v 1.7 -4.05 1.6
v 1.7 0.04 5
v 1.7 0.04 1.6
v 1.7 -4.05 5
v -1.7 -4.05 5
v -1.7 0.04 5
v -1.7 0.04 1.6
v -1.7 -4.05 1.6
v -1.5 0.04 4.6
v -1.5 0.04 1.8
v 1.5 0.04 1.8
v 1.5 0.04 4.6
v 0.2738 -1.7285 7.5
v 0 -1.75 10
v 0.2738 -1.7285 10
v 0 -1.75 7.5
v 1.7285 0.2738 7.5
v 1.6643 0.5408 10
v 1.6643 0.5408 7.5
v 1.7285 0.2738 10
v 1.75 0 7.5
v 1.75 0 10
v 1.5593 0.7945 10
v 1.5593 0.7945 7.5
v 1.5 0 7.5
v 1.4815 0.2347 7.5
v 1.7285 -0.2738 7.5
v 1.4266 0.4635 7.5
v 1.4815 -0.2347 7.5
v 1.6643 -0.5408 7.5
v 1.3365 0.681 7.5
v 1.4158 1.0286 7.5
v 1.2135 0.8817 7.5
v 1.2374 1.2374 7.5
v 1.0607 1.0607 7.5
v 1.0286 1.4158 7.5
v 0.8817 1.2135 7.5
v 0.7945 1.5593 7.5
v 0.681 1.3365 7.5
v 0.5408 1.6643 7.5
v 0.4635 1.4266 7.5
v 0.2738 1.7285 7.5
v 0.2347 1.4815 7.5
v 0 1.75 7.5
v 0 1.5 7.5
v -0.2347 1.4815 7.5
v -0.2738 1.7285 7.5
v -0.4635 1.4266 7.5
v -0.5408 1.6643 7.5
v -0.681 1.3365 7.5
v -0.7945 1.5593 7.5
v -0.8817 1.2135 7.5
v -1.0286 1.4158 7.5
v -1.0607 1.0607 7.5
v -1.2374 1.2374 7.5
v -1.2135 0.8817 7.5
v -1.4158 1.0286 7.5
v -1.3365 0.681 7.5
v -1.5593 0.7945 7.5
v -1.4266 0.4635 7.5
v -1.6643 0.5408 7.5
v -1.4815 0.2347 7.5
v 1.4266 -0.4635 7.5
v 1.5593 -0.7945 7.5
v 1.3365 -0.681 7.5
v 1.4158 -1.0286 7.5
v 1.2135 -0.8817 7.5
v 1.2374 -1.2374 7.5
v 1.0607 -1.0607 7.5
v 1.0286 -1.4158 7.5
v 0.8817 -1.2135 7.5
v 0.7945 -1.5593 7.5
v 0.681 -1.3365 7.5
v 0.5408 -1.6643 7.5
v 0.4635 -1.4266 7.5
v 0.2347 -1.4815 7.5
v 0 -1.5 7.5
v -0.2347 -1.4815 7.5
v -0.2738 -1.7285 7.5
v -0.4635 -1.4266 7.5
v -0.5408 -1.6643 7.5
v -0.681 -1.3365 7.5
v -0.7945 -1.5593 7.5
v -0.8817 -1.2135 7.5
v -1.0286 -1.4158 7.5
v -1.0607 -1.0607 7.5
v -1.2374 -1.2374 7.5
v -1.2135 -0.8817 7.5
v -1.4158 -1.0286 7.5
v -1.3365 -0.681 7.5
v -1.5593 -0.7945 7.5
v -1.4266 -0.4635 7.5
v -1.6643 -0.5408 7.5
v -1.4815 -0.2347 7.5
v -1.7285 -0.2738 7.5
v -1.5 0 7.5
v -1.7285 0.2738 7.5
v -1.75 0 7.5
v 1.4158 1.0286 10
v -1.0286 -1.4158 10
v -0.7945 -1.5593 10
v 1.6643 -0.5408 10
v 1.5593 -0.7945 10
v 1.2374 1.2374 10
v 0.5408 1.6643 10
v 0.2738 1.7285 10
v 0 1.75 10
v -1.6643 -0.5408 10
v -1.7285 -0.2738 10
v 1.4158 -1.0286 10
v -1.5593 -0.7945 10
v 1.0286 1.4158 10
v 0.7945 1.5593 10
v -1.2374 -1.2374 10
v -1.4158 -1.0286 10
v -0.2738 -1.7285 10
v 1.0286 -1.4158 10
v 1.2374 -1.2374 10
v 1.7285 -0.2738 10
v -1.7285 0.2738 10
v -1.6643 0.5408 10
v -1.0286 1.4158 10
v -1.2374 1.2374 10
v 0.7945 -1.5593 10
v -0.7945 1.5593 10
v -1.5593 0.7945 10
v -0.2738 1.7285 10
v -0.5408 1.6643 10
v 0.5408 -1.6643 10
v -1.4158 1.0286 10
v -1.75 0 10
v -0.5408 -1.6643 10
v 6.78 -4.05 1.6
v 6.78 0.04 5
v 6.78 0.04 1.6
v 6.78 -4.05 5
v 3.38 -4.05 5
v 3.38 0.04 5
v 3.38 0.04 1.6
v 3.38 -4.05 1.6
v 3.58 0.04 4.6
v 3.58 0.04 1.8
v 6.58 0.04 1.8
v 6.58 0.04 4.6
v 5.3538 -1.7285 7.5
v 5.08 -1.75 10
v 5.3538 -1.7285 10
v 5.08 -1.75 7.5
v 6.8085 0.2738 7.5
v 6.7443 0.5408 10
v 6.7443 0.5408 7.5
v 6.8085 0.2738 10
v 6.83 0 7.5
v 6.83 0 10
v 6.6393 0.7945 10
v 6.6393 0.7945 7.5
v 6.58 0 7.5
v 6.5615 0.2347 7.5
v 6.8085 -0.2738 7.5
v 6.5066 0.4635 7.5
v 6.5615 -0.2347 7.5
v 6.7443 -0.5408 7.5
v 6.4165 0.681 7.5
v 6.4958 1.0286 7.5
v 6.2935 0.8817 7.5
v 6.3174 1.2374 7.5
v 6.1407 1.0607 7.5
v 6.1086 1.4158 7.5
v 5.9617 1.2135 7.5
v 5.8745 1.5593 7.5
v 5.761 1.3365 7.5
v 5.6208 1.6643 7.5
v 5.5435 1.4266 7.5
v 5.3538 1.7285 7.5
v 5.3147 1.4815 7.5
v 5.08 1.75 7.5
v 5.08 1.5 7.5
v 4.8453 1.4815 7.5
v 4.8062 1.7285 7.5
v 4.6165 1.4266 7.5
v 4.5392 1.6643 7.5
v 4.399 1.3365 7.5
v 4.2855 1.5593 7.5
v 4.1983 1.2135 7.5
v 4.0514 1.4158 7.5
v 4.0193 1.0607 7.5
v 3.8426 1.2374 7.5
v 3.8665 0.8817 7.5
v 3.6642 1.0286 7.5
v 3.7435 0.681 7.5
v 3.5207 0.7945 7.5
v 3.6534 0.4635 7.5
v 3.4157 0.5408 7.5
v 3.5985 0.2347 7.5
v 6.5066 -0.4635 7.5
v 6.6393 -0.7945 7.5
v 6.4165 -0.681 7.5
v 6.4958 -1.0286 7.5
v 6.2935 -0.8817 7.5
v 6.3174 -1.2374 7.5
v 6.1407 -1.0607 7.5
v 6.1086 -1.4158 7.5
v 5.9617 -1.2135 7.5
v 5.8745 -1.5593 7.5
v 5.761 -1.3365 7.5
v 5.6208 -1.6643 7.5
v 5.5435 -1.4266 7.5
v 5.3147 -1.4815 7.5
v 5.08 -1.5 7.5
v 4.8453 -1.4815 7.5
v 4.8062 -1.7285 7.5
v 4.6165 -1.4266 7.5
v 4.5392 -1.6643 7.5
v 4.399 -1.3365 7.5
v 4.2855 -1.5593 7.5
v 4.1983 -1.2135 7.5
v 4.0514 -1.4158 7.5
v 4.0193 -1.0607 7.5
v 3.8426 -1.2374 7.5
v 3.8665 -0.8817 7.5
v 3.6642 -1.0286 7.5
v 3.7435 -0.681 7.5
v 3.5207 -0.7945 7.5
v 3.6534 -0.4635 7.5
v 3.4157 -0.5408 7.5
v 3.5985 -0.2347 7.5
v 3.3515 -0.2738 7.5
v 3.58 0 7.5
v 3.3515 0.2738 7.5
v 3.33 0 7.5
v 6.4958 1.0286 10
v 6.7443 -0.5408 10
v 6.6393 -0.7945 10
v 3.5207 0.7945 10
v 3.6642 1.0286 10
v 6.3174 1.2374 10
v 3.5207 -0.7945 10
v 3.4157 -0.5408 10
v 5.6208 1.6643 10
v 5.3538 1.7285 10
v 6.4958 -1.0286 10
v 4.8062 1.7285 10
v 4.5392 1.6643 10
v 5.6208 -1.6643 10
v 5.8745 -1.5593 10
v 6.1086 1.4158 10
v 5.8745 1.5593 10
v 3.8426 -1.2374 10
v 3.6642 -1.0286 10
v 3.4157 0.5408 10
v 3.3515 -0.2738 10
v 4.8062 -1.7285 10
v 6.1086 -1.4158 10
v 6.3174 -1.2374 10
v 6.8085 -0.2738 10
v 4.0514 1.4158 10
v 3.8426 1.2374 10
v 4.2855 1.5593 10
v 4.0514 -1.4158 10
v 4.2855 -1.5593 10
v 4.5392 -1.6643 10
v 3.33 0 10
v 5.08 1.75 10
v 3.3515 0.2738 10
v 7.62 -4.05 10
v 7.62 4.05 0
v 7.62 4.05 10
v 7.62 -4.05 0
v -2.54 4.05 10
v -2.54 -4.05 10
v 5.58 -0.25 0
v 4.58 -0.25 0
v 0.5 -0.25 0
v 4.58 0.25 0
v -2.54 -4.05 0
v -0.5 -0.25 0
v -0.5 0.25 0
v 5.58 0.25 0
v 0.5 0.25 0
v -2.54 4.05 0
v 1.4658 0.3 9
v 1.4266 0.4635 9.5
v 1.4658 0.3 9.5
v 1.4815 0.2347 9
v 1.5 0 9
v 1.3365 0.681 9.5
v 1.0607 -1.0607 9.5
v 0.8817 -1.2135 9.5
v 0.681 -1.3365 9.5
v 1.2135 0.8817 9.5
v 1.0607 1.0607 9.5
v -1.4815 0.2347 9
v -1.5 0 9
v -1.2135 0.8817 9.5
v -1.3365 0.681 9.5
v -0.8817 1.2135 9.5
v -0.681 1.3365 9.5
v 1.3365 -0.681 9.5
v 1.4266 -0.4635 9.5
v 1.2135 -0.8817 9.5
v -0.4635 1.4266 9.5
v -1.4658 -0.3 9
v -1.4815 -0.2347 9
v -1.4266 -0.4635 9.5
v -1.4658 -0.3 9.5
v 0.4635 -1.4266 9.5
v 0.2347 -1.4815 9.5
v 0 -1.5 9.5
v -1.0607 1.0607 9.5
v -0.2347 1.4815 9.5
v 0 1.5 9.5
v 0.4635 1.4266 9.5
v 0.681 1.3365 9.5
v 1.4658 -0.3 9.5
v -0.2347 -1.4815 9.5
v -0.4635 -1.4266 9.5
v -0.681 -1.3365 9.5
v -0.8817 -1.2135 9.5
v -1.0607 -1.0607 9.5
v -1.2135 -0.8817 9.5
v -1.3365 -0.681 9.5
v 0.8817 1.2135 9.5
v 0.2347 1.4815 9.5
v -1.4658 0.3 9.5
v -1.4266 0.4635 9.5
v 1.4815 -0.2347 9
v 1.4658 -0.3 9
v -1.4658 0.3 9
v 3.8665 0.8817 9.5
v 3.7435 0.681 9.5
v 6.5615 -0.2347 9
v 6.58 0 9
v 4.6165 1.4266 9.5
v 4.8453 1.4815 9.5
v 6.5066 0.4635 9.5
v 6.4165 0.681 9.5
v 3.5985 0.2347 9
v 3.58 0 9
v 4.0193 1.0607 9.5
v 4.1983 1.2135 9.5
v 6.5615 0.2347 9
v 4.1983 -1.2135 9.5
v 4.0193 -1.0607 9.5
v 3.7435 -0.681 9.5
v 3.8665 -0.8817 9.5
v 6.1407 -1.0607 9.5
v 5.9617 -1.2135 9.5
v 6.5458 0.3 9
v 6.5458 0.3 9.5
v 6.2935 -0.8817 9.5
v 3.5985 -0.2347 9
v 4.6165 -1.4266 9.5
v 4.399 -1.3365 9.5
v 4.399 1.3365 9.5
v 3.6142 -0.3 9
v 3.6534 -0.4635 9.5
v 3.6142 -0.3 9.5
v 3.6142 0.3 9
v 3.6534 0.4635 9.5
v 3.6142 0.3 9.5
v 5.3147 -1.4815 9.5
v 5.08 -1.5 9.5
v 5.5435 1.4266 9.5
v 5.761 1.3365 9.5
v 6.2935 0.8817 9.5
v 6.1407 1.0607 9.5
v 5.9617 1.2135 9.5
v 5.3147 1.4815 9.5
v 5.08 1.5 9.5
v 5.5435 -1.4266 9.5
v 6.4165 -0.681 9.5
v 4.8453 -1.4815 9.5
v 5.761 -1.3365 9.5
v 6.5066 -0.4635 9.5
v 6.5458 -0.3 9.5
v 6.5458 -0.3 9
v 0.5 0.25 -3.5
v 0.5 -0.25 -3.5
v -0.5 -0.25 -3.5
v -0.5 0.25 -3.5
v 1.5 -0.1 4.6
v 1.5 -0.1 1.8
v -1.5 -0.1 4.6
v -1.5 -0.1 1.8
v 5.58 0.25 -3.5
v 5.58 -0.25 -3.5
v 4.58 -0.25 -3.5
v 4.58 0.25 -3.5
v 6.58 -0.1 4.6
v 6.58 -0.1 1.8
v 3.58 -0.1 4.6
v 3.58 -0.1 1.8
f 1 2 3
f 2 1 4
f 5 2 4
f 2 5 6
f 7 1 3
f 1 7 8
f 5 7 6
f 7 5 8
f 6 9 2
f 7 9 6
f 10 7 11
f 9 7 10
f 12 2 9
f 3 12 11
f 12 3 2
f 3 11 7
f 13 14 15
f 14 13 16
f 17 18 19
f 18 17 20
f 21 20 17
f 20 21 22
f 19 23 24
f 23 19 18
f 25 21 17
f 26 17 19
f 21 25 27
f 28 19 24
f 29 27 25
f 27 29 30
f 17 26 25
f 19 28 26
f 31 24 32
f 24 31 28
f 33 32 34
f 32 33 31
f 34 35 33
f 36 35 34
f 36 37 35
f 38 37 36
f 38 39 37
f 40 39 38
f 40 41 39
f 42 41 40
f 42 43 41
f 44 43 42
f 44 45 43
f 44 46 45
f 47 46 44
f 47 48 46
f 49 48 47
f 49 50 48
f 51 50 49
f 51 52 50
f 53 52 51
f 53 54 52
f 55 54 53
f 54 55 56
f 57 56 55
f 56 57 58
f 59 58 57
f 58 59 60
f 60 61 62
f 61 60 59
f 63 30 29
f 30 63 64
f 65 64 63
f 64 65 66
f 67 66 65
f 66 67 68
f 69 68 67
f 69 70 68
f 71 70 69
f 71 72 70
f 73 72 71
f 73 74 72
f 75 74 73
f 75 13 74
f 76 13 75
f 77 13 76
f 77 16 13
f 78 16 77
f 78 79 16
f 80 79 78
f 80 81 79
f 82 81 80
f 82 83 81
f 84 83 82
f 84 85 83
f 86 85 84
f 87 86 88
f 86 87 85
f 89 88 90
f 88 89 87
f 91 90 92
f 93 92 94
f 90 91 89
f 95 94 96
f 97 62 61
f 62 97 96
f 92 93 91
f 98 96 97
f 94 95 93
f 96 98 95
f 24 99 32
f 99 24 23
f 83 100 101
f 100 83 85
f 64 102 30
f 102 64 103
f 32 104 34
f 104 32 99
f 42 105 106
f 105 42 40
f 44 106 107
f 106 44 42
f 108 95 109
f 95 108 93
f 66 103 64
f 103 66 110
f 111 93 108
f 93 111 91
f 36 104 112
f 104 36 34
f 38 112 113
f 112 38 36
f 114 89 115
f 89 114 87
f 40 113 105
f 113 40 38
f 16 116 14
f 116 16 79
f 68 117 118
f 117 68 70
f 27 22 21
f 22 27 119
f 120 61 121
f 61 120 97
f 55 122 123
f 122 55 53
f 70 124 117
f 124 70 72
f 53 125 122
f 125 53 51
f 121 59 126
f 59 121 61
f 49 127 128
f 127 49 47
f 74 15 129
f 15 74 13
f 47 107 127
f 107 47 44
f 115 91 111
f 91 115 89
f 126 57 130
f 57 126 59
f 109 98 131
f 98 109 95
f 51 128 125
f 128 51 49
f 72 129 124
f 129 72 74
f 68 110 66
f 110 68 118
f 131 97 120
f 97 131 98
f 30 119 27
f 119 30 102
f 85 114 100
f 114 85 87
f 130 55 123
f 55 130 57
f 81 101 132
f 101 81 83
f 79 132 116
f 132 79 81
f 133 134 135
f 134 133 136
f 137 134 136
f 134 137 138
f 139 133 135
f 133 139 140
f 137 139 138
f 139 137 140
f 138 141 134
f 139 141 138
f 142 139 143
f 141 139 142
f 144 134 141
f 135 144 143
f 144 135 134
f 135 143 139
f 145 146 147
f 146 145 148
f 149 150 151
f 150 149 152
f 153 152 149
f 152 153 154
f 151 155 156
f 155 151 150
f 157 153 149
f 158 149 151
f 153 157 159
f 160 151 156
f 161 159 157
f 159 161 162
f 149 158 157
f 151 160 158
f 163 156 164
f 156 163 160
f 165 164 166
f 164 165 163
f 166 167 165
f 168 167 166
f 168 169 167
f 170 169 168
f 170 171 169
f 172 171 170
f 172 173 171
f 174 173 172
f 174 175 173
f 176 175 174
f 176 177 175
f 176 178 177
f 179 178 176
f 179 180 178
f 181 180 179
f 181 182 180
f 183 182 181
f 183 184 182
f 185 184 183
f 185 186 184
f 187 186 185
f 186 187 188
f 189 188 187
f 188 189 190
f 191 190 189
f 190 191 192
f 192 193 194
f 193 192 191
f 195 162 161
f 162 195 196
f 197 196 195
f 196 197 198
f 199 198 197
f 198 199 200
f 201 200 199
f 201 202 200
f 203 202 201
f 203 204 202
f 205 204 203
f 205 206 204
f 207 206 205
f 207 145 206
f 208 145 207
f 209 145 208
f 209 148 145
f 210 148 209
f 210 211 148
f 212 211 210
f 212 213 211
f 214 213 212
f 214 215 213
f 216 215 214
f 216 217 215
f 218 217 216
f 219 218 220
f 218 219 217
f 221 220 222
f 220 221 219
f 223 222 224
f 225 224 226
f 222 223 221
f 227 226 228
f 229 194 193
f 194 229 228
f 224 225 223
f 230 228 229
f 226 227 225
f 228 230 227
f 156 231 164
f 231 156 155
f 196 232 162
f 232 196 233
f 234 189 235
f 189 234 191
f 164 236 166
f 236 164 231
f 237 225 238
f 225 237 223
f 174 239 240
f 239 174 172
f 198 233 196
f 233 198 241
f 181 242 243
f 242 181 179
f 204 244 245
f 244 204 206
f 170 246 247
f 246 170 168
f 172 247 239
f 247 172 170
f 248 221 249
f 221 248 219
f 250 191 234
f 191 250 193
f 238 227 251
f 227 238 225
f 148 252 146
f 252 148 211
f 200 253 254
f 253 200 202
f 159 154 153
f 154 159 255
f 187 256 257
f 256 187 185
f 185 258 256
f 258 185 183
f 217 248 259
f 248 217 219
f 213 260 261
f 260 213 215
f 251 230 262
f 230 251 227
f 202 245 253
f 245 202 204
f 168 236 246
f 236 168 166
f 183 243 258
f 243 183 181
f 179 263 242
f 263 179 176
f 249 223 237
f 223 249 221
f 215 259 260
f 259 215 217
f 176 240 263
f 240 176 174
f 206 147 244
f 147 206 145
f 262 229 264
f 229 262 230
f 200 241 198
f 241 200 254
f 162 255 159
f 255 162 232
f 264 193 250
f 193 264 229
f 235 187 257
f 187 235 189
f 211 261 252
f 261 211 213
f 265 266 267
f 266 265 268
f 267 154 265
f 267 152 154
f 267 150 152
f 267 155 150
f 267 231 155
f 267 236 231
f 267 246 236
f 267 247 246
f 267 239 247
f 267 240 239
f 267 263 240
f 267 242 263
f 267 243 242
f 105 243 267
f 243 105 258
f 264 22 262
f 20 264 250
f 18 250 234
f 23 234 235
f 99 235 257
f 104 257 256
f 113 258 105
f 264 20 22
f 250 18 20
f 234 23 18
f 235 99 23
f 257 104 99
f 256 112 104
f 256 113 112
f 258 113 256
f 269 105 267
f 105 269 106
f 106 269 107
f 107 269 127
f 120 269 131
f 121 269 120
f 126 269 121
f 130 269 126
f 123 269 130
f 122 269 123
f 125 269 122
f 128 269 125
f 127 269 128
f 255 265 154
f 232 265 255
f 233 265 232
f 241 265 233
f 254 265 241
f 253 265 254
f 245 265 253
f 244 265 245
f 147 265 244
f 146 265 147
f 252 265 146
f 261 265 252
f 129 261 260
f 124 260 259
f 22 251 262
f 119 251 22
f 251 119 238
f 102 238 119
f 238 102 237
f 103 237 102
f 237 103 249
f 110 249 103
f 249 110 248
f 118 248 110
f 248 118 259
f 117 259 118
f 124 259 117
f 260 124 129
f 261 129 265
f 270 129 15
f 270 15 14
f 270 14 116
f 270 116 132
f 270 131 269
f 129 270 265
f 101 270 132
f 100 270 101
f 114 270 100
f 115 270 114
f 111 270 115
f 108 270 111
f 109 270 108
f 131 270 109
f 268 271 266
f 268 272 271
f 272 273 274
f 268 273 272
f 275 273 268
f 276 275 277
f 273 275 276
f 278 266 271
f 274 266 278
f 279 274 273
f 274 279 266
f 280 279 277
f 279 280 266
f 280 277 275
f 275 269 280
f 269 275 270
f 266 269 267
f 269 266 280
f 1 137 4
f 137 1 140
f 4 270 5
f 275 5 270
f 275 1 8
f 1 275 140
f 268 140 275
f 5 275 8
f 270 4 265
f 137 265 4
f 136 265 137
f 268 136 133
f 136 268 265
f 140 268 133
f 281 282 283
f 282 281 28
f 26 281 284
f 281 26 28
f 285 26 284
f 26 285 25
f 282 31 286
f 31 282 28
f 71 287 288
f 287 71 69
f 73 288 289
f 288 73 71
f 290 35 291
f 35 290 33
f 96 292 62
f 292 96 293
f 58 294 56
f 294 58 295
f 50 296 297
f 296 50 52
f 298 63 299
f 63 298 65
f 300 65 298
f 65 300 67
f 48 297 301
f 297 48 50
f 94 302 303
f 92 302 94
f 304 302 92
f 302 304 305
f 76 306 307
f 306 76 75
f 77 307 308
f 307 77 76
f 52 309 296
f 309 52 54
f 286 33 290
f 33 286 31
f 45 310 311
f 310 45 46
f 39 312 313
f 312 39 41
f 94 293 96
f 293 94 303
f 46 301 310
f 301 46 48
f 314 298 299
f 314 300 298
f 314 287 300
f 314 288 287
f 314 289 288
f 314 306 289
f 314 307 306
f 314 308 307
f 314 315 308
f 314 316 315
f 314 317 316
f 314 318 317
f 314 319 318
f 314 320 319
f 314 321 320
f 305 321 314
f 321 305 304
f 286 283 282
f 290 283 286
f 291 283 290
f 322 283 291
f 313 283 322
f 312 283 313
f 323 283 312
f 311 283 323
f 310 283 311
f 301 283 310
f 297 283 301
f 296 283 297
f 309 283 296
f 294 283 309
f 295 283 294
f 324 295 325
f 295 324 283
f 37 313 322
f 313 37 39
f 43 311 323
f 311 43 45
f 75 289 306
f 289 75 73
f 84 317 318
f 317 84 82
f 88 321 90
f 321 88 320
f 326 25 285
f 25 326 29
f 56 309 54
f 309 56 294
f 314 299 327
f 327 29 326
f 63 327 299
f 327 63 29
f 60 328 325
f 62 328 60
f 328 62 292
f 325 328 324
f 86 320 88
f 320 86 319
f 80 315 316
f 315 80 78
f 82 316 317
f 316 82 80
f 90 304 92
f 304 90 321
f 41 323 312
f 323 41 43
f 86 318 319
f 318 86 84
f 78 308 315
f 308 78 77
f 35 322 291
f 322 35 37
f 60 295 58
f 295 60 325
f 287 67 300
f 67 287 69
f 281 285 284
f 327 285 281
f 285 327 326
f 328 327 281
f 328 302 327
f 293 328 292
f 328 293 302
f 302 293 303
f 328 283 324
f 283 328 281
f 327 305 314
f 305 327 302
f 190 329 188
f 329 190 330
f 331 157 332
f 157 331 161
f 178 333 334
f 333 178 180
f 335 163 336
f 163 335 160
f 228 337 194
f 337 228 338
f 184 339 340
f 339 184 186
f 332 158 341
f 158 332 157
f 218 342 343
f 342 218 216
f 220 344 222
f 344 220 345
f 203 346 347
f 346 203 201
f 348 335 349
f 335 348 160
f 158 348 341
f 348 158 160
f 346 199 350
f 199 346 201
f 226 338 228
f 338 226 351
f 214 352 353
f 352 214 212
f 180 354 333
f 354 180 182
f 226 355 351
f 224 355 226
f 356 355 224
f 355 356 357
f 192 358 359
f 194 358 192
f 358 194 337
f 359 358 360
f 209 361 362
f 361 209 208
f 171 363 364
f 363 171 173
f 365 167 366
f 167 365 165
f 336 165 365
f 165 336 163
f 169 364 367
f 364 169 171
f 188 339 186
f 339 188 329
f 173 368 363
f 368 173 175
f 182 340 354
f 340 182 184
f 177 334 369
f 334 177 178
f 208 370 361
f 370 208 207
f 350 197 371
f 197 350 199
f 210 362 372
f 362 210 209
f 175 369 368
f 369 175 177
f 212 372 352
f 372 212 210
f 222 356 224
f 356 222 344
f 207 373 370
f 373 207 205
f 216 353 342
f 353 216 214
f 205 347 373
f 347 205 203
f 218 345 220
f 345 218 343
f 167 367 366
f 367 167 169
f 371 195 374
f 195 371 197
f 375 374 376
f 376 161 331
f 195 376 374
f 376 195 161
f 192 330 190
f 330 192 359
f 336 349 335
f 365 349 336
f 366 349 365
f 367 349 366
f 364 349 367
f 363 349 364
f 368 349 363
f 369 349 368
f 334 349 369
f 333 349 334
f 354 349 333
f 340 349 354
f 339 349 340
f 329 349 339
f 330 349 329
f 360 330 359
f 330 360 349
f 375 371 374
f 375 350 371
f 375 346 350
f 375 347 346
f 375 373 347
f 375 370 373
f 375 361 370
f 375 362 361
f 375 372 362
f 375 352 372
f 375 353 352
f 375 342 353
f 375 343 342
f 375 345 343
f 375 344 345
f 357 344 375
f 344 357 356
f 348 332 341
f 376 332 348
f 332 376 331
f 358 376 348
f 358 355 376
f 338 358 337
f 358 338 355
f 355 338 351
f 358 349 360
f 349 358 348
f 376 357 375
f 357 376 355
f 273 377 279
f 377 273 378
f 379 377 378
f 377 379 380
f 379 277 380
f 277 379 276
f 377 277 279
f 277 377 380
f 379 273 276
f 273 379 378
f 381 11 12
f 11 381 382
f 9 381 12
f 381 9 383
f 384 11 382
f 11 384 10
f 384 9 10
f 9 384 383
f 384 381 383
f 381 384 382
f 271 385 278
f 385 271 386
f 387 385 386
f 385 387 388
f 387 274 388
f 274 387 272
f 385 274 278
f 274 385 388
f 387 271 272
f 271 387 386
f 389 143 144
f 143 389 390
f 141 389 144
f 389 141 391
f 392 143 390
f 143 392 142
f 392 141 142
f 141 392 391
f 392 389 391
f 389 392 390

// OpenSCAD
// Simplified visualization of Phoenix Contact 5442206 BC-508X10-2 GN.
// Envelope and pin locations: Phoenix specifications and BC-508X10 drawing.
// https://www.phoenixcontact.com/en-us/products/printed-circuit-board-terminal-bc-508x10-2-gn-5442206
// Body 10.16 x 8.10 x 10 mm; pin pitch 5.08; pin length 3.5 mm.
// Pin row centered in depth. Pin 1 at origin, pin 2 at +X.
// Wire entry is -Y in model coordinates (+Y in KiCad footprint coordinates).
// Port, screw, and clamp details are illustrative, not manufacturing geometry.
part = "all";
$fn = 40;
pitch = 5.08;
body_width = 10.16;
body_depth = 8.1;
body_height = 10;
module housing() {
    difference() {
        translate([-pitch/2, -body_depth/2, 0])
            cube([body_width, body_depth, body_height]);
        for (x = [0, pitch]) {
            translate([x-1.7, -body_depth/2-0.01, 1.6]) cube([3.4, 4.1, 3.4]);
            translate([x, 0, 7.5]) cylinder(h=2.6, r=1.75);
        }
    }
}
module metal() {
    for (x = [0, pitch]) {
        translate([x-0.5, -0.25, -3.5]) cube([1, 0.5, 3.6]);
        difference() {
            translate([x, 0, 7.5]) cylinder(h=2, r=1.5);
            translate([x-1.6, -0.3, 9]) cube([3.2, 0.6, 0.6]);
        }
        translate([x-1.5, -0.1, 1.8]) cube([3, 0.3, 2.8]);
    }
}
if (part == "all" || part == "housing") color([0.28, 0.58, 0.35]) housing();
if (part == "all" || part == "metal") color([0.7, 0.7, 0.72]) metal();
